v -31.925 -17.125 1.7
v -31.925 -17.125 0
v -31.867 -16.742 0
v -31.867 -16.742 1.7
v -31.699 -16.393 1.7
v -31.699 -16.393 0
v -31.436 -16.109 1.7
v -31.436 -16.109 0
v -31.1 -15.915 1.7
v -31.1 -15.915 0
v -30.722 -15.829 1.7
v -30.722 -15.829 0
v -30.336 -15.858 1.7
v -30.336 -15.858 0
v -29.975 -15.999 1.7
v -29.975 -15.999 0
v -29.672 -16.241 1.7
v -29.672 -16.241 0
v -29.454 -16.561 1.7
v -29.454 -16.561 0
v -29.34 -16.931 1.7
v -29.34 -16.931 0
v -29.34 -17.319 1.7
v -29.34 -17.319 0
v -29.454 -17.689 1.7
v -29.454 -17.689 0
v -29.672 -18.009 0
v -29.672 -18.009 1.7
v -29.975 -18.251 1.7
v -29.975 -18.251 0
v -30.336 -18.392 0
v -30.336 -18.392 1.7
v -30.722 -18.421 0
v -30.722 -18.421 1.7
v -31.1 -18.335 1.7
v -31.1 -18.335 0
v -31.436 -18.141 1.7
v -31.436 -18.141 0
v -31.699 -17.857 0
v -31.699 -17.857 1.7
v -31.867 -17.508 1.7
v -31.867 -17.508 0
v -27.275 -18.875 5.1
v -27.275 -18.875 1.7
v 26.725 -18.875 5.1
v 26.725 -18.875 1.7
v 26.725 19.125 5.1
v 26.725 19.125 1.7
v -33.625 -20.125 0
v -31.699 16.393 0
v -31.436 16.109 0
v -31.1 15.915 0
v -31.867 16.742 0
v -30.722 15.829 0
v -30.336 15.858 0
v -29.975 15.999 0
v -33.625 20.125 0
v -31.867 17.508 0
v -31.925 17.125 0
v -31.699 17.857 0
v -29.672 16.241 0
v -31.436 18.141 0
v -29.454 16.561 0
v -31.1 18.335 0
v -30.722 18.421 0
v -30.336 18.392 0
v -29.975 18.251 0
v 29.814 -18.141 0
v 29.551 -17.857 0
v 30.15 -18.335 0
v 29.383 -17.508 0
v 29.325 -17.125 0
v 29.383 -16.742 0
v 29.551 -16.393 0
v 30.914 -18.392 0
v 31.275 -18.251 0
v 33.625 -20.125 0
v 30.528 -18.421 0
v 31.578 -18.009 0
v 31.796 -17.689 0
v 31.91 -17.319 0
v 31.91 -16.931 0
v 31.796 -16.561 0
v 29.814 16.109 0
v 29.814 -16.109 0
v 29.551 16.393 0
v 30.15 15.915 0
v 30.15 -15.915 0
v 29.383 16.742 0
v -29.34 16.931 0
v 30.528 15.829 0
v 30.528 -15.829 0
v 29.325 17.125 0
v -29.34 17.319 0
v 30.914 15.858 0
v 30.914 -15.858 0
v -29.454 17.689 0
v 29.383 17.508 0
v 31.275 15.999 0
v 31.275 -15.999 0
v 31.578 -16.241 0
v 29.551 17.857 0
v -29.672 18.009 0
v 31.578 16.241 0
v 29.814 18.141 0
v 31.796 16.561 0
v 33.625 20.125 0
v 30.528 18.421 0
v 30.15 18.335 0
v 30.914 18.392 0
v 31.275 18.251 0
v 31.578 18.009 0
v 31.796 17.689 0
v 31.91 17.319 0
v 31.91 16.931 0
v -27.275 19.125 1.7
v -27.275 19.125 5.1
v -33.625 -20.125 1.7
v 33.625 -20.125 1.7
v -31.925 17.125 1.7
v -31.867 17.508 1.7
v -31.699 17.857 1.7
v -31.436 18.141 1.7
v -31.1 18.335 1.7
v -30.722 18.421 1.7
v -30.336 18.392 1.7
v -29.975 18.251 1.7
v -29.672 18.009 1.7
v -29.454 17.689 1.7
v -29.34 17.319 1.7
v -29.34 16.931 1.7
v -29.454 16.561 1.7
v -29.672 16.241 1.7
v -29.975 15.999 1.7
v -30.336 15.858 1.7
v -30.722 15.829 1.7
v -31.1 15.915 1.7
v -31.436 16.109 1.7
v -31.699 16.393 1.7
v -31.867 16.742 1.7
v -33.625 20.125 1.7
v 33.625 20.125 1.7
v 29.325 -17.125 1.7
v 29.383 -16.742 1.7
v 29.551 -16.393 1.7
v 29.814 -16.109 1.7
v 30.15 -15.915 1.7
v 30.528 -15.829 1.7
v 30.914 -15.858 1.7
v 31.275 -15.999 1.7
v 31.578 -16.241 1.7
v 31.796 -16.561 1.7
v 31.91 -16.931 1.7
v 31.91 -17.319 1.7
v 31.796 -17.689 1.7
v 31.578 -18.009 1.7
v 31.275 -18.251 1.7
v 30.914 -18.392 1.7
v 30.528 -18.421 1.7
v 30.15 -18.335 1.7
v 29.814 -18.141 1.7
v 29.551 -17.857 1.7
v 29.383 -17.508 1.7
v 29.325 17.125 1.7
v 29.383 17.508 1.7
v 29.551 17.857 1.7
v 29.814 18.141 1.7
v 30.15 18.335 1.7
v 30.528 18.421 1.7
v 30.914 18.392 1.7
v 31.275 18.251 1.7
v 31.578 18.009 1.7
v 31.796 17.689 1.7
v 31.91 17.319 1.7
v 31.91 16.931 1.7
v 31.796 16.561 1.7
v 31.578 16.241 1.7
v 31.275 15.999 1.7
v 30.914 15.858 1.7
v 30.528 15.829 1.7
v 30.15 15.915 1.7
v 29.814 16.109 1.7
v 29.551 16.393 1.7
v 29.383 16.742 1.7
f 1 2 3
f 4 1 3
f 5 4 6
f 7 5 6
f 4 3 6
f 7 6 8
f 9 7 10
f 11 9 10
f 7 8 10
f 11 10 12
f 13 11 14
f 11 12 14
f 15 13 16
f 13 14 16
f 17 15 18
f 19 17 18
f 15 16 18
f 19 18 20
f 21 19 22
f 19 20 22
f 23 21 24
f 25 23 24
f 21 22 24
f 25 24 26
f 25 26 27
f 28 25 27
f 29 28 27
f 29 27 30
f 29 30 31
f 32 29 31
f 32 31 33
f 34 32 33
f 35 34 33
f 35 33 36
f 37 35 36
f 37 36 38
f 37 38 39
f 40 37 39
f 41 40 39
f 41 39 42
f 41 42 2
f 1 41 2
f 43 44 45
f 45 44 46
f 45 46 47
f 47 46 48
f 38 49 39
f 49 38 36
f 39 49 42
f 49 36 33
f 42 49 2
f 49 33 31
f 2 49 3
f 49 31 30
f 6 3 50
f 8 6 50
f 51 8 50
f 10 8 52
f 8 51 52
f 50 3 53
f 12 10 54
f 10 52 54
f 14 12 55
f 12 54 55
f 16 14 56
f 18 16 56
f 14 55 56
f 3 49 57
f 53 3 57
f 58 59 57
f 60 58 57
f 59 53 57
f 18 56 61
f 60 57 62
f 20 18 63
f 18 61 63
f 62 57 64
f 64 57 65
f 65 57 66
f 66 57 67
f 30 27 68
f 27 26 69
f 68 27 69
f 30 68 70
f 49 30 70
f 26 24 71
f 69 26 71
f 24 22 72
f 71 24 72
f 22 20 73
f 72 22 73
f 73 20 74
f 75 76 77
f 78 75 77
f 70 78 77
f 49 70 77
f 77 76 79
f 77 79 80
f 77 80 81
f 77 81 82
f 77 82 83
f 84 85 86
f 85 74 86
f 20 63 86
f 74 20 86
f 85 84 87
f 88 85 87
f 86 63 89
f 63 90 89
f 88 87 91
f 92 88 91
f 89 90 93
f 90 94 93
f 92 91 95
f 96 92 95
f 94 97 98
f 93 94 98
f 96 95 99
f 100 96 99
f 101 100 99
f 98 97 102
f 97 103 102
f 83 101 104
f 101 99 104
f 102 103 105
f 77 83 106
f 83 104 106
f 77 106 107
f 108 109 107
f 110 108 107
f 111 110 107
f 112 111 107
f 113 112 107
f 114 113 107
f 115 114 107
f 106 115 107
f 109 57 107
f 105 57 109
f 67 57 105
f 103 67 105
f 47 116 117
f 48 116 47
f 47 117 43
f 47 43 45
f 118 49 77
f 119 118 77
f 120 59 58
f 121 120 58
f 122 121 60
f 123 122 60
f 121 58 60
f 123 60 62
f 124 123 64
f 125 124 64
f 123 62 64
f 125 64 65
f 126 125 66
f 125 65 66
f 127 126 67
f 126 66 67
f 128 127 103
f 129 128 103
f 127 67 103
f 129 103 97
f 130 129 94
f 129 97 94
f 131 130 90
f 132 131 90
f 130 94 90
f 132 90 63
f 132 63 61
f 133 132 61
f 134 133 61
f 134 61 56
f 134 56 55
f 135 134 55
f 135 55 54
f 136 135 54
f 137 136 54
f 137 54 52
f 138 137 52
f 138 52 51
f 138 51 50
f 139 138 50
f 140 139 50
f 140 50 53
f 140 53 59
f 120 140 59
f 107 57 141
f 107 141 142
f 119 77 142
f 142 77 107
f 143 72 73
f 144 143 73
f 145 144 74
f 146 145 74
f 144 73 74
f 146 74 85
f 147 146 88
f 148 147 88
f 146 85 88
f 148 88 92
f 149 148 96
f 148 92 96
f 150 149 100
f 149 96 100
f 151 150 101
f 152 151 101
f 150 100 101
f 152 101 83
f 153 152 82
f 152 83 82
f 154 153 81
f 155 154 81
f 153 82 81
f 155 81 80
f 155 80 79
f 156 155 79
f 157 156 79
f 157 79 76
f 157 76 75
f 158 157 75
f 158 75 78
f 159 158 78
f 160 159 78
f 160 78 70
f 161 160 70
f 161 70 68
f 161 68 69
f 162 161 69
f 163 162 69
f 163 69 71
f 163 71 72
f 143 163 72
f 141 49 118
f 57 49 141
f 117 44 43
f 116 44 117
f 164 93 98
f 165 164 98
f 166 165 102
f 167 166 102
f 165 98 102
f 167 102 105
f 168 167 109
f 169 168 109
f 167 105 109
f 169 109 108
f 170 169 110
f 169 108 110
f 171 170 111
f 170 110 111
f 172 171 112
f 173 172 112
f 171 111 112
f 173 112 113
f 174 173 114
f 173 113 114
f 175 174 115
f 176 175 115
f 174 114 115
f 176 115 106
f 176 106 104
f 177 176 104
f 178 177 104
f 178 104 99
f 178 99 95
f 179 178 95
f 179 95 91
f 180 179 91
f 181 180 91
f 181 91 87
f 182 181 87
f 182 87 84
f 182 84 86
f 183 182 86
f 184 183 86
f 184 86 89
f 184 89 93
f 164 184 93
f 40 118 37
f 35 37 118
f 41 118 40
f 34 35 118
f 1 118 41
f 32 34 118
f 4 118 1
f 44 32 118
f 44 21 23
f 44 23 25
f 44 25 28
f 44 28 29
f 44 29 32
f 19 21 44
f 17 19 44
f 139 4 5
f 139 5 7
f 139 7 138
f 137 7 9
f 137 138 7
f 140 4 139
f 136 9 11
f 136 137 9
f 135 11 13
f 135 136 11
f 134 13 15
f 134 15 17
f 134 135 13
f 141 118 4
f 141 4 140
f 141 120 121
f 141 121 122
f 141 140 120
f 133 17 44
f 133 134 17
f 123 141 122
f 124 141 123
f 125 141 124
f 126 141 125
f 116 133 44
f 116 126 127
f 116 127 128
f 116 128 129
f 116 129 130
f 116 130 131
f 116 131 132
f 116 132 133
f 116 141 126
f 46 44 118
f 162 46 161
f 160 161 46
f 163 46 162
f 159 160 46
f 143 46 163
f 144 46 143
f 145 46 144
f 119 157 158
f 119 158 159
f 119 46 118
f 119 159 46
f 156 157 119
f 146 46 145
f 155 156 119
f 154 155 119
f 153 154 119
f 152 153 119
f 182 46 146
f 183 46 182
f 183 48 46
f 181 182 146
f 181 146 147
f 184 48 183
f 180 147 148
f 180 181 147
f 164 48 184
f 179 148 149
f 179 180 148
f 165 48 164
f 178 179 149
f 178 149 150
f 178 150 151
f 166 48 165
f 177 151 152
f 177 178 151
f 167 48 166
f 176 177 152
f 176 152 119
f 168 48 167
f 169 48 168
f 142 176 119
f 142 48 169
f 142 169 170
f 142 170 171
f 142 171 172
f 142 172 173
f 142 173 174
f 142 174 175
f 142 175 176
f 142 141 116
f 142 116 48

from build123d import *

# Parameters (mm, degrees)
SKETCH_1_W        = 67.25
SKETCH_1_H        = 40.25
EXTRUDE_1_DEPTH   = 1.7
SKETCH_2_W        = 54
SKETCH_2_H        = 38
EXTRUDE_2_DEPTH   = 3.4
HOLE_WIZARD_M21_D = 2.6


with BuildPart() as part:
    # Эскиз1 → Бобышка-Вытянуть1 (new body)
    with BuildSketch(Plane.XY):
        Rectangle(SKETCH_1_W, SKETCH_1_H)
    extrude(amount=EXTRUDE_1_DEPTH)

    # Эскиз2 → Бобышка-Вытянуть2 (add)
    with BuildSketch(Plane.XY.offset(1.7)):
        with Locations((-0.275, 0.125)):
            Rectangle(SKETCH_2_W, SKETCH_2_H)
    extrude(amount=EXTRUDE_2_DEPTH)

    # Отверстие с зазором M21 (through all)
    with Locations(Plane.XY.offset(1.7)):
        with Locations((-30.625, 17.125), (-30.625, -17.125), (30.625, -17.125), (30.625, 17.125)):
            Hole(HOLE_WIZARD_M21_D / 2)


solid = part.part
